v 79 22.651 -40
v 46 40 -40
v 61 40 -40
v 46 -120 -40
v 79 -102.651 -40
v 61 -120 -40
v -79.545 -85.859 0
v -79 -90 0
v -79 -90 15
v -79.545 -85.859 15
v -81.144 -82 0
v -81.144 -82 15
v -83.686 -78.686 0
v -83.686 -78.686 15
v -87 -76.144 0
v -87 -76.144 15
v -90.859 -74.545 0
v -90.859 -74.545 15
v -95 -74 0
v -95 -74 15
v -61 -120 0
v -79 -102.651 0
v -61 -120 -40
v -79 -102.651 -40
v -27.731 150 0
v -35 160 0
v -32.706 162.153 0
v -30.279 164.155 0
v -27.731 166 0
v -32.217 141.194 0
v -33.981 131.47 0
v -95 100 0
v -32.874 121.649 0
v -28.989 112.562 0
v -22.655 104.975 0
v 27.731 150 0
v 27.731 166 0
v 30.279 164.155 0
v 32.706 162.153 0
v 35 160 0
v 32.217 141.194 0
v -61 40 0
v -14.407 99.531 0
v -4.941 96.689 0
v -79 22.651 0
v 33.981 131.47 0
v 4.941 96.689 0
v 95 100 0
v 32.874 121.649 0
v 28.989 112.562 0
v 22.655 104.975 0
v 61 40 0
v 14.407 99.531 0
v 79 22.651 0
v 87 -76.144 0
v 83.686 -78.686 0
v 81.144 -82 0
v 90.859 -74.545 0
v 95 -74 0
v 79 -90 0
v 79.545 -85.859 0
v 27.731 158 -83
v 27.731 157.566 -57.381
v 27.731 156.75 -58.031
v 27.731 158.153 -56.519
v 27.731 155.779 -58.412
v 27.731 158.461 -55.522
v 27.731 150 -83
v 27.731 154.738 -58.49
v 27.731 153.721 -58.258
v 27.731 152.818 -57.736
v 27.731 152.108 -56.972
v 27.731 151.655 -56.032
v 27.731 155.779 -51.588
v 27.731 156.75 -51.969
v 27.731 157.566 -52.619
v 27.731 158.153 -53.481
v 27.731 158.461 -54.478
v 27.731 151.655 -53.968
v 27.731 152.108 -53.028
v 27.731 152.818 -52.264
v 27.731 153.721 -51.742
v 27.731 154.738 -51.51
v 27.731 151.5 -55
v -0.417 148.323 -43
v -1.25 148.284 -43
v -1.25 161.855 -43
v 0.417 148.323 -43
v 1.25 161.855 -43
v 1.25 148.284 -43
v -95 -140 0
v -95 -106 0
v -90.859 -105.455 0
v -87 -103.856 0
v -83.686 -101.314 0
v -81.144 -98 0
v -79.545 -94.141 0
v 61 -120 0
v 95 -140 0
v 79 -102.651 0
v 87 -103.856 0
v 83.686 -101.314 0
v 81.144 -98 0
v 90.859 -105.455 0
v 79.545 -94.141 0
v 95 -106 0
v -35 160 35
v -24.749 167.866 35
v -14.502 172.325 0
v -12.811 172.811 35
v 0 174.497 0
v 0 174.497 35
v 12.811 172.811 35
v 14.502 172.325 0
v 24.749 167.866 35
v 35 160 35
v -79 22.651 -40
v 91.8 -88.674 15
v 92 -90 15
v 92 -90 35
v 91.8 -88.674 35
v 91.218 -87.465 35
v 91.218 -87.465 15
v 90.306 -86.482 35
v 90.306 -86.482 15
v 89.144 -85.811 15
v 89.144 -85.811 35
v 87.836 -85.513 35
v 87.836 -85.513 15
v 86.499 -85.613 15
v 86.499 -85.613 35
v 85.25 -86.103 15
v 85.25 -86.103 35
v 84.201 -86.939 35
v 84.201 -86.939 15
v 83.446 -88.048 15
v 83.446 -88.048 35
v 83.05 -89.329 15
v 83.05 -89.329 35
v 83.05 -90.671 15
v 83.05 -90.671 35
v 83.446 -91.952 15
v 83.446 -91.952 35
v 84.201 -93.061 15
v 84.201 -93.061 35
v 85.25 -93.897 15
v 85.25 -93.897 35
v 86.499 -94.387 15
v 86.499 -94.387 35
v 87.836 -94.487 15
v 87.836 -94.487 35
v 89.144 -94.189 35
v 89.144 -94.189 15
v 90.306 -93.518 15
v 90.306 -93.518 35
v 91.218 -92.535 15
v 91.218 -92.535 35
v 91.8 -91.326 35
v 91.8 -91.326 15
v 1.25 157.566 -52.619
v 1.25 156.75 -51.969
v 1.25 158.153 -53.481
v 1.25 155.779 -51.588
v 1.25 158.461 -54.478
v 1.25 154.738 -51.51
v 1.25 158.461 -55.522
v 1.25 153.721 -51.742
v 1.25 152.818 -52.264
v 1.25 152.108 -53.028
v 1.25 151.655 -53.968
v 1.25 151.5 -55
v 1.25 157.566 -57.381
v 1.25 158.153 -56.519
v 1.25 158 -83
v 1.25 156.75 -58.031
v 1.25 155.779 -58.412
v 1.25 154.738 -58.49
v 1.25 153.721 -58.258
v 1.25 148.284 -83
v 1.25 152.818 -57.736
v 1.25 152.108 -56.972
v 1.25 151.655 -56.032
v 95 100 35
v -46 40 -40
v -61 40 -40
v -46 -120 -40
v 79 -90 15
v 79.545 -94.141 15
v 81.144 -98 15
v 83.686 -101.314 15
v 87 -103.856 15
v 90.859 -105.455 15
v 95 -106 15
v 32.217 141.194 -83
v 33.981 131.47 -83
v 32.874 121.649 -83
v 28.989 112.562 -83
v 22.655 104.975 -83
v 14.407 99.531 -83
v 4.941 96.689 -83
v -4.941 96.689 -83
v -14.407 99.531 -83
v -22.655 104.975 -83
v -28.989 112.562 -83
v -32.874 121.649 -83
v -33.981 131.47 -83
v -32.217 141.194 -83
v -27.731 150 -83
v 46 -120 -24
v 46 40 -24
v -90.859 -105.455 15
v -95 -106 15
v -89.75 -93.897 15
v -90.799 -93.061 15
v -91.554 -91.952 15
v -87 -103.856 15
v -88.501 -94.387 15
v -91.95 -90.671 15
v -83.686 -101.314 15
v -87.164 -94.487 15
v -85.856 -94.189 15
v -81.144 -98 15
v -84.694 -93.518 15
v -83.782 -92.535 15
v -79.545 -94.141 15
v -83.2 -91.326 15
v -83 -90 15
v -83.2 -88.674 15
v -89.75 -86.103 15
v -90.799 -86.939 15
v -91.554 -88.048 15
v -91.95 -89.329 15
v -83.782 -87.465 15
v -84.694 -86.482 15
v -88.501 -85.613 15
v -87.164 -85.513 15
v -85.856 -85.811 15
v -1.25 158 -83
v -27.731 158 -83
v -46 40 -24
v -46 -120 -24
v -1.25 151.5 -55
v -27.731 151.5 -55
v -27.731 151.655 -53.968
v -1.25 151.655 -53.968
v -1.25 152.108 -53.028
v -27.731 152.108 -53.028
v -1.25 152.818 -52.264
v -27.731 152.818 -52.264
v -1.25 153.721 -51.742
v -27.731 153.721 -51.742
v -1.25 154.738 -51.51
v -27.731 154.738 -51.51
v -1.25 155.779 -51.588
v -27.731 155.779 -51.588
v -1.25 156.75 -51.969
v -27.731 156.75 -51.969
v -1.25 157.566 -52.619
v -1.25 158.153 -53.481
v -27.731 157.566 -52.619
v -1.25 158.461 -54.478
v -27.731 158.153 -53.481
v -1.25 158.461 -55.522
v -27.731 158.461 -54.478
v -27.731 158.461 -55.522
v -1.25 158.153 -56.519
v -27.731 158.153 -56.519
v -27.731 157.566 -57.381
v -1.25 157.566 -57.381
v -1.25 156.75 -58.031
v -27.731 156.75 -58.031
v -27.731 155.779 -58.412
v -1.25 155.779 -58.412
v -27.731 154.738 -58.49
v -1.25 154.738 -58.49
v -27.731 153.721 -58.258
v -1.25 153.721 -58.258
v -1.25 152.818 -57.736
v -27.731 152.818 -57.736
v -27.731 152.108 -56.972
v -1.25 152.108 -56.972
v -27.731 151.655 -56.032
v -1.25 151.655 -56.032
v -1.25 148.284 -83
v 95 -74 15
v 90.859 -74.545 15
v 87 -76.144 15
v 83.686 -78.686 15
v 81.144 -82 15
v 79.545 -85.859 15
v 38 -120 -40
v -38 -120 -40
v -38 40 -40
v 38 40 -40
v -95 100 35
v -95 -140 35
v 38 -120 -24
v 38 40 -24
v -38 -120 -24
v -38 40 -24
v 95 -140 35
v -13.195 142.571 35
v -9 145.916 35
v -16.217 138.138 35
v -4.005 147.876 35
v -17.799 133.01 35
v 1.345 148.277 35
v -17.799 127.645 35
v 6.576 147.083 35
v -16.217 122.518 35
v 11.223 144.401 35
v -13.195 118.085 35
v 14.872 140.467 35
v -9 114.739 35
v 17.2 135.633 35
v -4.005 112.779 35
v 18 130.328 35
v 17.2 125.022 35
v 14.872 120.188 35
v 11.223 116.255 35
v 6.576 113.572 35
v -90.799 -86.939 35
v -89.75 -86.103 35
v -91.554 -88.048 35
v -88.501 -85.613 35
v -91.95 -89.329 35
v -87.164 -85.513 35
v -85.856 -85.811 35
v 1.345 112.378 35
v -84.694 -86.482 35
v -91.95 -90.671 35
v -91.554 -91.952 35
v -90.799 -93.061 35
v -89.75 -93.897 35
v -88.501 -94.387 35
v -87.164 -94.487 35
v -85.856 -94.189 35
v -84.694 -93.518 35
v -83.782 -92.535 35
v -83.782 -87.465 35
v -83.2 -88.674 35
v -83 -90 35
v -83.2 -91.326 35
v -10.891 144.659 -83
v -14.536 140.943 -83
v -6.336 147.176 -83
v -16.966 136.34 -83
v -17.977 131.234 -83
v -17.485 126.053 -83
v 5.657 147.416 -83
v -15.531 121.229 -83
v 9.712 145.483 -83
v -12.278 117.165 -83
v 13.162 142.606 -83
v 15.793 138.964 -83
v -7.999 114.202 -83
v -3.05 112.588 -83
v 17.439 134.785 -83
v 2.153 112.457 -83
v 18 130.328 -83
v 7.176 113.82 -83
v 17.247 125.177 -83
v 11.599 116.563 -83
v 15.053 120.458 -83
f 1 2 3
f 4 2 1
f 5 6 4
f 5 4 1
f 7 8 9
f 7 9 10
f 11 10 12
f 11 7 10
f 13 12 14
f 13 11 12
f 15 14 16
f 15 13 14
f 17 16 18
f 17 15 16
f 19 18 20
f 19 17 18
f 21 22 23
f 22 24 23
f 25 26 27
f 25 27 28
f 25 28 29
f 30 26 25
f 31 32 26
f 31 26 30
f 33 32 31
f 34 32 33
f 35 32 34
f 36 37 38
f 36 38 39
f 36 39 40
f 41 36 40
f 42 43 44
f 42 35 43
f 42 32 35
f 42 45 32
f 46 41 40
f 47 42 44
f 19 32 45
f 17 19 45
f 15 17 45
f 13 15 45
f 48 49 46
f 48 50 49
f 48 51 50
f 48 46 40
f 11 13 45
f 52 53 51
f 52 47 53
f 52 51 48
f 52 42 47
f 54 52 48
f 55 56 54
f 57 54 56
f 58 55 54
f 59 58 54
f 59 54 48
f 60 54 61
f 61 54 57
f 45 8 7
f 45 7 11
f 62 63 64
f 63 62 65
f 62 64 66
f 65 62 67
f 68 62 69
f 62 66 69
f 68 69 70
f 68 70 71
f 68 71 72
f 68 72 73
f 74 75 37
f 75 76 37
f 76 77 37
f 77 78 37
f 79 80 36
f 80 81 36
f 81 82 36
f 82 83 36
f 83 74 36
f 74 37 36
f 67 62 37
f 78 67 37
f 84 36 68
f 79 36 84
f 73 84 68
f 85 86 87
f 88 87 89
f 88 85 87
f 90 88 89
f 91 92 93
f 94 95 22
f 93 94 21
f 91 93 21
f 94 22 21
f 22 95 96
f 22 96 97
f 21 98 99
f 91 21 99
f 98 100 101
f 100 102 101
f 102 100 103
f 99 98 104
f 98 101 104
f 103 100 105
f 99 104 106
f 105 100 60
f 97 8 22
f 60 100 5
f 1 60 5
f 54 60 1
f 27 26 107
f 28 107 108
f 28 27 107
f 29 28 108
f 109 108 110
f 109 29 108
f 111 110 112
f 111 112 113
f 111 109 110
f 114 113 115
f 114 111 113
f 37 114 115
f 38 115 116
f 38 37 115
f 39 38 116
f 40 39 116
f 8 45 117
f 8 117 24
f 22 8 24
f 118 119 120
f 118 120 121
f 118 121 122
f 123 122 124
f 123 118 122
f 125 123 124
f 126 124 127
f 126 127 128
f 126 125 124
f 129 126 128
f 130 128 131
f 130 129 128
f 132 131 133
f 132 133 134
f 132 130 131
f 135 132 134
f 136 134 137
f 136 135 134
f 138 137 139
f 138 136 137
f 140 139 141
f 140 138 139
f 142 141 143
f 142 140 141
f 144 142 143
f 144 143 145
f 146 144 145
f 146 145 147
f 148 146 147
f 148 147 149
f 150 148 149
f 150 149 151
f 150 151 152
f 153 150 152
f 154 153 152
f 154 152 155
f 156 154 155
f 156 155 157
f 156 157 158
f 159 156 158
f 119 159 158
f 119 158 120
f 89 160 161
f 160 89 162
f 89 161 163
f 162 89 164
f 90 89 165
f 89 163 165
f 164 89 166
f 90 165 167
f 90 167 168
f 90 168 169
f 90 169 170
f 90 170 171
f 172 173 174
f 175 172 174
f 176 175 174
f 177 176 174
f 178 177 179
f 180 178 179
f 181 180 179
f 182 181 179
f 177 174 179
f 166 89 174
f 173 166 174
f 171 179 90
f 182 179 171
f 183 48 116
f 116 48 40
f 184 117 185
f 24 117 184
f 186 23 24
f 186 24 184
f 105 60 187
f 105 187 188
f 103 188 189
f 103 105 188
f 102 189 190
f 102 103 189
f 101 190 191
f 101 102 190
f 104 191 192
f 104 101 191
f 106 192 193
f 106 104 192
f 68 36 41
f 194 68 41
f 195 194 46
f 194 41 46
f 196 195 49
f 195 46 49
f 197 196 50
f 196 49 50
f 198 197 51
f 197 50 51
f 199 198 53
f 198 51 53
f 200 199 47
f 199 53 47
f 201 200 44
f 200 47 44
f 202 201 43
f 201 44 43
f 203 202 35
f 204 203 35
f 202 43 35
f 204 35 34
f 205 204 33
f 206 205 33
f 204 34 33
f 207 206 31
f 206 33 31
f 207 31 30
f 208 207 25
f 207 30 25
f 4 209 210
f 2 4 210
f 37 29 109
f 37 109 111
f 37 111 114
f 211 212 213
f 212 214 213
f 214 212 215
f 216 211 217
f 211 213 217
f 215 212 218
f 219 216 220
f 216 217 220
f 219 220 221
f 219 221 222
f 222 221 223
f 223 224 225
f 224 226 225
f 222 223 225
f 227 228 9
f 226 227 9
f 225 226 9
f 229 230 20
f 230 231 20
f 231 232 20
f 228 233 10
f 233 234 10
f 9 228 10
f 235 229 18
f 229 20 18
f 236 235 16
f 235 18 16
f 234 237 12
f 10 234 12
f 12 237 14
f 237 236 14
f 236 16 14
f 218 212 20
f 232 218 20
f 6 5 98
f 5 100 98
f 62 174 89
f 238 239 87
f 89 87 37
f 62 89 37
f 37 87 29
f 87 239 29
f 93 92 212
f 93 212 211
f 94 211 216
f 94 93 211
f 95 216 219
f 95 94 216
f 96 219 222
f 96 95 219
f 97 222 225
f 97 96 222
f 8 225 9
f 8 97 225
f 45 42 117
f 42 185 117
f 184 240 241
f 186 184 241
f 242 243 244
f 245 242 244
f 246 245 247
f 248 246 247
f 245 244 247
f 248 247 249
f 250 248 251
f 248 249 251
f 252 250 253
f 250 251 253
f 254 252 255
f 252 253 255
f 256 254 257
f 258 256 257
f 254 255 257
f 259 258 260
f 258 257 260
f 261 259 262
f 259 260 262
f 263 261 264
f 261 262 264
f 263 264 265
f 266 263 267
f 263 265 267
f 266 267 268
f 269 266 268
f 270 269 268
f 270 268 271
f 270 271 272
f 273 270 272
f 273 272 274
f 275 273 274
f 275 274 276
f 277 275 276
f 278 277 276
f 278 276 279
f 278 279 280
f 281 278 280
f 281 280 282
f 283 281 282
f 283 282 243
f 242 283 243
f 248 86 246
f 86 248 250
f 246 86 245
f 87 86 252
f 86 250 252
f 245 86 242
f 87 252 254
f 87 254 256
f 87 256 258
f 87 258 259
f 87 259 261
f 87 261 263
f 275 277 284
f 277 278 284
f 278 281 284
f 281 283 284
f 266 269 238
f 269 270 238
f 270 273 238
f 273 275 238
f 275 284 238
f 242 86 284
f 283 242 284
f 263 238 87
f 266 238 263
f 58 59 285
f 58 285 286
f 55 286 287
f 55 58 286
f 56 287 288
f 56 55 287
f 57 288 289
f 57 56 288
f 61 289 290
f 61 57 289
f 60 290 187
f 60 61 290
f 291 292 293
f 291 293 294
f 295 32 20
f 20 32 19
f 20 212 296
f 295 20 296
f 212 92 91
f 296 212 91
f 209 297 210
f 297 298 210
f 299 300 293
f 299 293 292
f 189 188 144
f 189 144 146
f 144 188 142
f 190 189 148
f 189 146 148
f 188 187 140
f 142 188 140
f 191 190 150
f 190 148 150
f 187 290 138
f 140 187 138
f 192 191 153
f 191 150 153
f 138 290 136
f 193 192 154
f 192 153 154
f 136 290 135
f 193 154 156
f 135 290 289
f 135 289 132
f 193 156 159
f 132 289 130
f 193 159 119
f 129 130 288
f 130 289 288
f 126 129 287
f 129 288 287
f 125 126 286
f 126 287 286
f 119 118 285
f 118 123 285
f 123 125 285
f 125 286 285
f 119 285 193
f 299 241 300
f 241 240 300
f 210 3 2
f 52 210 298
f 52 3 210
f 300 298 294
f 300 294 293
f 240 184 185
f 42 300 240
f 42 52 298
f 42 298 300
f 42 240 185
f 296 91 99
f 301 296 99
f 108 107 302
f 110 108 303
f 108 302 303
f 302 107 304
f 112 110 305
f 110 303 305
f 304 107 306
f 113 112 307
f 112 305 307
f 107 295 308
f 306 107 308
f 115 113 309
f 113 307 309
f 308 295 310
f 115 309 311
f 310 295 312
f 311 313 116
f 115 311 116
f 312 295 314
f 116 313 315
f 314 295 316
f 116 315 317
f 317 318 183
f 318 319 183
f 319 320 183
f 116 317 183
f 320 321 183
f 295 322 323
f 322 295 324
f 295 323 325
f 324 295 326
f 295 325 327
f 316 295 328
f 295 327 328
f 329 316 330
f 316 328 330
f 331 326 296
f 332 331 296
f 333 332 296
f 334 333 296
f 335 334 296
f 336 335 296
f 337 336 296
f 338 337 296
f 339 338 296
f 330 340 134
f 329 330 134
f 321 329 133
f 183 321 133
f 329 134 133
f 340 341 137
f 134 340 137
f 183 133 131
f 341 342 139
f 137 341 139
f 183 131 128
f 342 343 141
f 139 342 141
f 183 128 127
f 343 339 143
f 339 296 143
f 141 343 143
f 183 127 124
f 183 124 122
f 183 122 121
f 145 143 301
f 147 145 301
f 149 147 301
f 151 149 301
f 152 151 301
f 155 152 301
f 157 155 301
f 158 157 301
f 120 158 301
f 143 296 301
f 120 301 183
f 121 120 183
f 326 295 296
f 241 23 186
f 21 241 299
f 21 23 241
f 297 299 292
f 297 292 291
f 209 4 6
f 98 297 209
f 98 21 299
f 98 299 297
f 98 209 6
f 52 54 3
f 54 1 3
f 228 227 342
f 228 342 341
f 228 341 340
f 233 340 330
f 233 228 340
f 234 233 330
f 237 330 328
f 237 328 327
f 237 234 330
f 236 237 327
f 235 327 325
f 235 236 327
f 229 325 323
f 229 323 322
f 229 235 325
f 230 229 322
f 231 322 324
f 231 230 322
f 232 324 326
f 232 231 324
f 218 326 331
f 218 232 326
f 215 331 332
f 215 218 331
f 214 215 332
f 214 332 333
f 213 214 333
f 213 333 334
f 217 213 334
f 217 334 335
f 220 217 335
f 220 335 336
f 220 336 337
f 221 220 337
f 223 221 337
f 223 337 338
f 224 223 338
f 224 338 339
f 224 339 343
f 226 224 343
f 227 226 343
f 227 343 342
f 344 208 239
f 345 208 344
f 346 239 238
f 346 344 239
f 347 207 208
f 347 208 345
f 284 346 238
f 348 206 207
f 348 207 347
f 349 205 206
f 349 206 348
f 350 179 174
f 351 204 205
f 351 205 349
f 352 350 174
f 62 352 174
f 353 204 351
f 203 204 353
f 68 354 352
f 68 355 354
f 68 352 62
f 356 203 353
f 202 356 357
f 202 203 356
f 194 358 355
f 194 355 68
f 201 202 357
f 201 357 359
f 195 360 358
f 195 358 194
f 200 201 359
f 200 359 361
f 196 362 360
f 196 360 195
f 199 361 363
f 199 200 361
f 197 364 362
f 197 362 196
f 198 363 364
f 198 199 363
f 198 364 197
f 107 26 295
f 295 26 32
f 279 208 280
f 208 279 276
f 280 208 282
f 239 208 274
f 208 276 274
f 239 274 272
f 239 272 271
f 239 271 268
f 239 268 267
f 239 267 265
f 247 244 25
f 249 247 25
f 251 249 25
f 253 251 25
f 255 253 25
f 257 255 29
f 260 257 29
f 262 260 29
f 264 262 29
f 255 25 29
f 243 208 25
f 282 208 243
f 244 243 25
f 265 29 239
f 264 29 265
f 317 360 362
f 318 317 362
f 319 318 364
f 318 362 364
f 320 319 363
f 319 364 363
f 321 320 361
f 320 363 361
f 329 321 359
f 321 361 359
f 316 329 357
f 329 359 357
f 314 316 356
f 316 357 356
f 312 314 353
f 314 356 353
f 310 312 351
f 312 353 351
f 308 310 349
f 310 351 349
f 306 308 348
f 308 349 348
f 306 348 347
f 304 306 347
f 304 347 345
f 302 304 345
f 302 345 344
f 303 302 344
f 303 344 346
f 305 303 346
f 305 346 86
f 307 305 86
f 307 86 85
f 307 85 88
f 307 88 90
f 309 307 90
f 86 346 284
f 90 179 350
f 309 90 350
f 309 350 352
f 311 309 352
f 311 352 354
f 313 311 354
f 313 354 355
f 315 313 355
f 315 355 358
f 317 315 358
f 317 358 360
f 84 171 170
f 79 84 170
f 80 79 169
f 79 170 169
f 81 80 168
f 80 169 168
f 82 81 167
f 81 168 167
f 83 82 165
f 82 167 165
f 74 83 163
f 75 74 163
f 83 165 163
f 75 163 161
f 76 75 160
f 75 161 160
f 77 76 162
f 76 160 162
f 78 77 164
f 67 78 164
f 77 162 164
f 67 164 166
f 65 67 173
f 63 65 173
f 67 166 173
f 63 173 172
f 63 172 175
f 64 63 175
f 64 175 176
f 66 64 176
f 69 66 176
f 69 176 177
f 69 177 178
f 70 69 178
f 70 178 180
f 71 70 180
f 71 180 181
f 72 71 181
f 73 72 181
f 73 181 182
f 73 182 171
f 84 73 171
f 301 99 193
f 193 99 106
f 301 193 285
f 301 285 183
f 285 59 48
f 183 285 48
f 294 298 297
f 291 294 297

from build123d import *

# Parameters (mm, degrees)
F0_R      = 4.5
F1_DEPTH  = 35
F2_DEPTH  = 24
F3_DEPTH  = 15
F5_DEPTH  = 35
F7_DEPTH  = 83
F9_DEPTH  = 290
F10_R     = 18
F11_DEPTH = 199
F12_W     = 2.5
F12_H     = 32
F13_DEPTH = 40
F8_R      = 3.5
F14_DEPTH = 99.1
F15_W     = 76
F15_H     = 160
F16_DEPTH = 16
F17_DEPTH = 24


# Not quite as in the source:
# - a feature names something its author has since deleted; it is built from what else it names


with BuildPart() as f1:
    # F0 (on Top) → F1 (new body)
    with BuildSketch(Plane.XY):
        with BuildLine():
            Line((95, 100), (35, 160))
            Line((35, 160), (-35, 160))
            Line((-35, 160), (-95, 100))
            Line((-95, 100), (-95, -74))
            ThreePointArc((-95, -74), (-83.686291501, -78.686291501), (-79, -90))
            Line((-79, -90), (-79, 40))
            Line((-79, 40), (79, 40))
            Line((79, 40), (79, -90))
            ThreePointArc((79, -90), (83.686291501, -78.686291501), (95, -74))
            Line((95, -74), (95, 100))
        make_face()
        with BuildLine():
            Line((95, -140), (95, -106))
            ThreePointArc((95, -106), (83.686291501, -101.313708499), (79, -90))
            Line((79, -90), (79, -120))
            Line((79, -120), (-79, -120))
            Line((-79, -120), (-79, -90))
            ThreePointArc((-79, -90), (-83.686291501, -101.313708499), (-95, -106))
            Line((-95, -106), (-95, -140))
            Line((-95, -140), (95, -140))
        make_face()
        with BuildLine():
            ThreePointArc((-79, -90), (-83.686291501, -78.686291501), (-95, -74))
            Line((-95, -74), (-95, -106))
            ThreePointArc((-95, -106), (-83.686291501, -101.313708499), (-79, -90))
        make_face()
        with Locations((-87.5, -90)):
            Circle(F0_R, mode=Mode.SUBTRACT)
        with BuildLine():
            Line((95, -106), (95, -74))
            ThreePointArc((95, -74), (83.686291501, -78.686291501), (79, -90))
            ThreePointArc((79, -90), (83.686291501, -101.313708499), (95, -106))
        make_face()
        with Locations((87.5, -90)):
            Circle(F0_R, mode=Mode.SUBTRACT)
        Polygon((79, -120), (79, -90), (79, 40), (-79, 40), (-79, -90), (-79, -120), align=None)
    extrude(amount=F1_DEPTH)

    # F0 (on Top) → F2 (join)
    with BuildSketch(Plane.XY):
        Polygon((79, -120), (79, -90), (79, 40), (-79, 40), (-79, -90), (-79, -120), align=None)
    extrude(amount=-F2_DEPTH)

    # F0 (on Top) → F3 (cut)
    with BuildSketch(Plane.XY):
        with BuildLine():
            ThreePointArc((-79, -90), (-83.686291501, -78.686291501), (-95, -74))
            Line((-95, -74), (-95, -106))
            ThreePointArc((-95, -106), (-83.686291501, -101.313708499), (-79, -90))
        make_face()
        with Locations((-87.5, -90)):
            Circle(F0_R, mode=Mode.SUBTRACT)
        with BuildLine():
            Line((95, -106), (95, -74))
            ThreePointArc((95, -74), (83.686291501, -78.686291501), (79, -90))
            ThreePointArc((79, -90), (83.686291501, -101.313708499), (95, -106))
        make_face()
        with Locations((87.5, -90)):
            Circle(F0_R, mode=Mode.SUBTRACT)
    extrude(amount=F3_DEPTH, mode=Mode.SUBTRACT)

    # F4 (on face) → F5 (join)
    with BuildSketch(Plane(origin=(0, 0, 0), x_dir=(1, 0, 0), z_dir=(0, 0, -1))):
        with BuildLine():
            Line((35, -160), (-35, -160))
            ThreePointArc((-35, -160), (0, -174.4974746831), (35, -160))
        make_face()
    extrude(amount=-F5_DEPTH)

    # F6 (on face) → F7 (join)
    with BuildSketch(Plane(origin=(0, 0, 0), x_dir=(1, 0, 0), z_dir=(0, 0, -1))):
        with BuildLine():
            Line((-27.7308492477, -166), (27.7308492477, -166))
            Line((27.7308492477, -166), (27.7308492477, -150))
            ThreePointArc((27.7308492477, -150), (0, -96.3276844271), (-27.7308492477, -150))
            Line((-27.7308492477, -150), (-27.7308492477, -166))
        make_face()
    extrude(amount=F7_DEPTH)

    # F8 (on face) → F9 (cut)
    with BuildSketch(Plane(origin=(-27.7308492477, 0, 0), x_dir=(0, -1, 0), z_dir=(-1, 0, 0))):
        Polygon((-158, -83), (-166, 0), (-166, -83), align=None)
    extrude(amount=-F9_DEPTH, mode=Mode.SUBTRACT)

    # F10 (on face) → F11 (cut)
    with BuildSketch(Plane(origin=(0, 0, -83), x_dir=(1, 0, 0), z_dir=(0, 0, -1))):
        with Locations((0, -130.3276844271)):
            Circle(F10_R)
    extrude(amount=-F11_DEPTH, mode=Mode.SUBTRACT)

    # F12 (on face) → F13 (cut)
    with BuildSketch(Plane(origin=(0, 0, -83), x_dir=(1, 0, 0), z_dir=(0, 0, -1))):
        with Locations((0, -174)):
            Rectangle(F12_W, F12_H)
        with BuildLine():
            ThreePointArc((1.25, -148.2842291949), (0, -148.3276844271), (-1.25, -148.2842291949))
            Line((-1.25, -148.2842291949), (-1.25, -158))
            Line((-1.25, -158), (1.25, -158))
            Line((1.25, -158), (1.25, -148.2842291949))
        make_face()
    extrude(amount=-F13_DEPTH, mode=Mode.SUBTRACT)

    # F8 (on face) → F14 (cut)
    with BuildSketch(Plane(origin=(-27.7308492477, 0, 0), x_dir=(0, -1, 0), z_dir=(-1, 0, 0))):
        with Locations((-155, -55)):
            Circle(F8_R)
    extrude(amount=-F14_DEPTH, mode=Mode.SUBTRACT)

    # F15 (on face) → F16 (join)
    with BuildSketch(Plane(origin=(0, 0, -24), x_dir=(1, 0, 0), z_dir=(0, 0, -1))):
        Polygon((-46, -40), (-46, 120), (-61, 120), (-79, 102.6506484271), (-79, -22.6506484271), (-61, -40), align=None)
        with Locations((0, 40)):
            Rectangle(F15_W, F15_H)
        Polygon((61, 120), (46, 120), (46, -40), (61, -40), (79, -22.6506484271), (79, 102.6506484271), align=None)
    extrude(amount=F16_DEPTH)

    # F15 (on face) → F17 (cut)
    with BuildSketch(Plane(origin=(0, 0, -24), x_dir=(1, 0, 0), z_dir=(0, 0, -1))):
        Polygon((-79, -40), (-61, -40), (-79, -22.6506484271), align=None)
        Polygon((-79, 102.6506484271), (-61, 120), (-79, 120), align=None)
        Polygon((79, 120), (61, 120), (79, 102.6506484271), align=None)
        Polygon((79, -22.6506484271), (61, -40), (79, -40), align=None)
    extrude(amount=-F17_DEPTH, mode=Mode.SUBTRACT)


solid = f1.part
